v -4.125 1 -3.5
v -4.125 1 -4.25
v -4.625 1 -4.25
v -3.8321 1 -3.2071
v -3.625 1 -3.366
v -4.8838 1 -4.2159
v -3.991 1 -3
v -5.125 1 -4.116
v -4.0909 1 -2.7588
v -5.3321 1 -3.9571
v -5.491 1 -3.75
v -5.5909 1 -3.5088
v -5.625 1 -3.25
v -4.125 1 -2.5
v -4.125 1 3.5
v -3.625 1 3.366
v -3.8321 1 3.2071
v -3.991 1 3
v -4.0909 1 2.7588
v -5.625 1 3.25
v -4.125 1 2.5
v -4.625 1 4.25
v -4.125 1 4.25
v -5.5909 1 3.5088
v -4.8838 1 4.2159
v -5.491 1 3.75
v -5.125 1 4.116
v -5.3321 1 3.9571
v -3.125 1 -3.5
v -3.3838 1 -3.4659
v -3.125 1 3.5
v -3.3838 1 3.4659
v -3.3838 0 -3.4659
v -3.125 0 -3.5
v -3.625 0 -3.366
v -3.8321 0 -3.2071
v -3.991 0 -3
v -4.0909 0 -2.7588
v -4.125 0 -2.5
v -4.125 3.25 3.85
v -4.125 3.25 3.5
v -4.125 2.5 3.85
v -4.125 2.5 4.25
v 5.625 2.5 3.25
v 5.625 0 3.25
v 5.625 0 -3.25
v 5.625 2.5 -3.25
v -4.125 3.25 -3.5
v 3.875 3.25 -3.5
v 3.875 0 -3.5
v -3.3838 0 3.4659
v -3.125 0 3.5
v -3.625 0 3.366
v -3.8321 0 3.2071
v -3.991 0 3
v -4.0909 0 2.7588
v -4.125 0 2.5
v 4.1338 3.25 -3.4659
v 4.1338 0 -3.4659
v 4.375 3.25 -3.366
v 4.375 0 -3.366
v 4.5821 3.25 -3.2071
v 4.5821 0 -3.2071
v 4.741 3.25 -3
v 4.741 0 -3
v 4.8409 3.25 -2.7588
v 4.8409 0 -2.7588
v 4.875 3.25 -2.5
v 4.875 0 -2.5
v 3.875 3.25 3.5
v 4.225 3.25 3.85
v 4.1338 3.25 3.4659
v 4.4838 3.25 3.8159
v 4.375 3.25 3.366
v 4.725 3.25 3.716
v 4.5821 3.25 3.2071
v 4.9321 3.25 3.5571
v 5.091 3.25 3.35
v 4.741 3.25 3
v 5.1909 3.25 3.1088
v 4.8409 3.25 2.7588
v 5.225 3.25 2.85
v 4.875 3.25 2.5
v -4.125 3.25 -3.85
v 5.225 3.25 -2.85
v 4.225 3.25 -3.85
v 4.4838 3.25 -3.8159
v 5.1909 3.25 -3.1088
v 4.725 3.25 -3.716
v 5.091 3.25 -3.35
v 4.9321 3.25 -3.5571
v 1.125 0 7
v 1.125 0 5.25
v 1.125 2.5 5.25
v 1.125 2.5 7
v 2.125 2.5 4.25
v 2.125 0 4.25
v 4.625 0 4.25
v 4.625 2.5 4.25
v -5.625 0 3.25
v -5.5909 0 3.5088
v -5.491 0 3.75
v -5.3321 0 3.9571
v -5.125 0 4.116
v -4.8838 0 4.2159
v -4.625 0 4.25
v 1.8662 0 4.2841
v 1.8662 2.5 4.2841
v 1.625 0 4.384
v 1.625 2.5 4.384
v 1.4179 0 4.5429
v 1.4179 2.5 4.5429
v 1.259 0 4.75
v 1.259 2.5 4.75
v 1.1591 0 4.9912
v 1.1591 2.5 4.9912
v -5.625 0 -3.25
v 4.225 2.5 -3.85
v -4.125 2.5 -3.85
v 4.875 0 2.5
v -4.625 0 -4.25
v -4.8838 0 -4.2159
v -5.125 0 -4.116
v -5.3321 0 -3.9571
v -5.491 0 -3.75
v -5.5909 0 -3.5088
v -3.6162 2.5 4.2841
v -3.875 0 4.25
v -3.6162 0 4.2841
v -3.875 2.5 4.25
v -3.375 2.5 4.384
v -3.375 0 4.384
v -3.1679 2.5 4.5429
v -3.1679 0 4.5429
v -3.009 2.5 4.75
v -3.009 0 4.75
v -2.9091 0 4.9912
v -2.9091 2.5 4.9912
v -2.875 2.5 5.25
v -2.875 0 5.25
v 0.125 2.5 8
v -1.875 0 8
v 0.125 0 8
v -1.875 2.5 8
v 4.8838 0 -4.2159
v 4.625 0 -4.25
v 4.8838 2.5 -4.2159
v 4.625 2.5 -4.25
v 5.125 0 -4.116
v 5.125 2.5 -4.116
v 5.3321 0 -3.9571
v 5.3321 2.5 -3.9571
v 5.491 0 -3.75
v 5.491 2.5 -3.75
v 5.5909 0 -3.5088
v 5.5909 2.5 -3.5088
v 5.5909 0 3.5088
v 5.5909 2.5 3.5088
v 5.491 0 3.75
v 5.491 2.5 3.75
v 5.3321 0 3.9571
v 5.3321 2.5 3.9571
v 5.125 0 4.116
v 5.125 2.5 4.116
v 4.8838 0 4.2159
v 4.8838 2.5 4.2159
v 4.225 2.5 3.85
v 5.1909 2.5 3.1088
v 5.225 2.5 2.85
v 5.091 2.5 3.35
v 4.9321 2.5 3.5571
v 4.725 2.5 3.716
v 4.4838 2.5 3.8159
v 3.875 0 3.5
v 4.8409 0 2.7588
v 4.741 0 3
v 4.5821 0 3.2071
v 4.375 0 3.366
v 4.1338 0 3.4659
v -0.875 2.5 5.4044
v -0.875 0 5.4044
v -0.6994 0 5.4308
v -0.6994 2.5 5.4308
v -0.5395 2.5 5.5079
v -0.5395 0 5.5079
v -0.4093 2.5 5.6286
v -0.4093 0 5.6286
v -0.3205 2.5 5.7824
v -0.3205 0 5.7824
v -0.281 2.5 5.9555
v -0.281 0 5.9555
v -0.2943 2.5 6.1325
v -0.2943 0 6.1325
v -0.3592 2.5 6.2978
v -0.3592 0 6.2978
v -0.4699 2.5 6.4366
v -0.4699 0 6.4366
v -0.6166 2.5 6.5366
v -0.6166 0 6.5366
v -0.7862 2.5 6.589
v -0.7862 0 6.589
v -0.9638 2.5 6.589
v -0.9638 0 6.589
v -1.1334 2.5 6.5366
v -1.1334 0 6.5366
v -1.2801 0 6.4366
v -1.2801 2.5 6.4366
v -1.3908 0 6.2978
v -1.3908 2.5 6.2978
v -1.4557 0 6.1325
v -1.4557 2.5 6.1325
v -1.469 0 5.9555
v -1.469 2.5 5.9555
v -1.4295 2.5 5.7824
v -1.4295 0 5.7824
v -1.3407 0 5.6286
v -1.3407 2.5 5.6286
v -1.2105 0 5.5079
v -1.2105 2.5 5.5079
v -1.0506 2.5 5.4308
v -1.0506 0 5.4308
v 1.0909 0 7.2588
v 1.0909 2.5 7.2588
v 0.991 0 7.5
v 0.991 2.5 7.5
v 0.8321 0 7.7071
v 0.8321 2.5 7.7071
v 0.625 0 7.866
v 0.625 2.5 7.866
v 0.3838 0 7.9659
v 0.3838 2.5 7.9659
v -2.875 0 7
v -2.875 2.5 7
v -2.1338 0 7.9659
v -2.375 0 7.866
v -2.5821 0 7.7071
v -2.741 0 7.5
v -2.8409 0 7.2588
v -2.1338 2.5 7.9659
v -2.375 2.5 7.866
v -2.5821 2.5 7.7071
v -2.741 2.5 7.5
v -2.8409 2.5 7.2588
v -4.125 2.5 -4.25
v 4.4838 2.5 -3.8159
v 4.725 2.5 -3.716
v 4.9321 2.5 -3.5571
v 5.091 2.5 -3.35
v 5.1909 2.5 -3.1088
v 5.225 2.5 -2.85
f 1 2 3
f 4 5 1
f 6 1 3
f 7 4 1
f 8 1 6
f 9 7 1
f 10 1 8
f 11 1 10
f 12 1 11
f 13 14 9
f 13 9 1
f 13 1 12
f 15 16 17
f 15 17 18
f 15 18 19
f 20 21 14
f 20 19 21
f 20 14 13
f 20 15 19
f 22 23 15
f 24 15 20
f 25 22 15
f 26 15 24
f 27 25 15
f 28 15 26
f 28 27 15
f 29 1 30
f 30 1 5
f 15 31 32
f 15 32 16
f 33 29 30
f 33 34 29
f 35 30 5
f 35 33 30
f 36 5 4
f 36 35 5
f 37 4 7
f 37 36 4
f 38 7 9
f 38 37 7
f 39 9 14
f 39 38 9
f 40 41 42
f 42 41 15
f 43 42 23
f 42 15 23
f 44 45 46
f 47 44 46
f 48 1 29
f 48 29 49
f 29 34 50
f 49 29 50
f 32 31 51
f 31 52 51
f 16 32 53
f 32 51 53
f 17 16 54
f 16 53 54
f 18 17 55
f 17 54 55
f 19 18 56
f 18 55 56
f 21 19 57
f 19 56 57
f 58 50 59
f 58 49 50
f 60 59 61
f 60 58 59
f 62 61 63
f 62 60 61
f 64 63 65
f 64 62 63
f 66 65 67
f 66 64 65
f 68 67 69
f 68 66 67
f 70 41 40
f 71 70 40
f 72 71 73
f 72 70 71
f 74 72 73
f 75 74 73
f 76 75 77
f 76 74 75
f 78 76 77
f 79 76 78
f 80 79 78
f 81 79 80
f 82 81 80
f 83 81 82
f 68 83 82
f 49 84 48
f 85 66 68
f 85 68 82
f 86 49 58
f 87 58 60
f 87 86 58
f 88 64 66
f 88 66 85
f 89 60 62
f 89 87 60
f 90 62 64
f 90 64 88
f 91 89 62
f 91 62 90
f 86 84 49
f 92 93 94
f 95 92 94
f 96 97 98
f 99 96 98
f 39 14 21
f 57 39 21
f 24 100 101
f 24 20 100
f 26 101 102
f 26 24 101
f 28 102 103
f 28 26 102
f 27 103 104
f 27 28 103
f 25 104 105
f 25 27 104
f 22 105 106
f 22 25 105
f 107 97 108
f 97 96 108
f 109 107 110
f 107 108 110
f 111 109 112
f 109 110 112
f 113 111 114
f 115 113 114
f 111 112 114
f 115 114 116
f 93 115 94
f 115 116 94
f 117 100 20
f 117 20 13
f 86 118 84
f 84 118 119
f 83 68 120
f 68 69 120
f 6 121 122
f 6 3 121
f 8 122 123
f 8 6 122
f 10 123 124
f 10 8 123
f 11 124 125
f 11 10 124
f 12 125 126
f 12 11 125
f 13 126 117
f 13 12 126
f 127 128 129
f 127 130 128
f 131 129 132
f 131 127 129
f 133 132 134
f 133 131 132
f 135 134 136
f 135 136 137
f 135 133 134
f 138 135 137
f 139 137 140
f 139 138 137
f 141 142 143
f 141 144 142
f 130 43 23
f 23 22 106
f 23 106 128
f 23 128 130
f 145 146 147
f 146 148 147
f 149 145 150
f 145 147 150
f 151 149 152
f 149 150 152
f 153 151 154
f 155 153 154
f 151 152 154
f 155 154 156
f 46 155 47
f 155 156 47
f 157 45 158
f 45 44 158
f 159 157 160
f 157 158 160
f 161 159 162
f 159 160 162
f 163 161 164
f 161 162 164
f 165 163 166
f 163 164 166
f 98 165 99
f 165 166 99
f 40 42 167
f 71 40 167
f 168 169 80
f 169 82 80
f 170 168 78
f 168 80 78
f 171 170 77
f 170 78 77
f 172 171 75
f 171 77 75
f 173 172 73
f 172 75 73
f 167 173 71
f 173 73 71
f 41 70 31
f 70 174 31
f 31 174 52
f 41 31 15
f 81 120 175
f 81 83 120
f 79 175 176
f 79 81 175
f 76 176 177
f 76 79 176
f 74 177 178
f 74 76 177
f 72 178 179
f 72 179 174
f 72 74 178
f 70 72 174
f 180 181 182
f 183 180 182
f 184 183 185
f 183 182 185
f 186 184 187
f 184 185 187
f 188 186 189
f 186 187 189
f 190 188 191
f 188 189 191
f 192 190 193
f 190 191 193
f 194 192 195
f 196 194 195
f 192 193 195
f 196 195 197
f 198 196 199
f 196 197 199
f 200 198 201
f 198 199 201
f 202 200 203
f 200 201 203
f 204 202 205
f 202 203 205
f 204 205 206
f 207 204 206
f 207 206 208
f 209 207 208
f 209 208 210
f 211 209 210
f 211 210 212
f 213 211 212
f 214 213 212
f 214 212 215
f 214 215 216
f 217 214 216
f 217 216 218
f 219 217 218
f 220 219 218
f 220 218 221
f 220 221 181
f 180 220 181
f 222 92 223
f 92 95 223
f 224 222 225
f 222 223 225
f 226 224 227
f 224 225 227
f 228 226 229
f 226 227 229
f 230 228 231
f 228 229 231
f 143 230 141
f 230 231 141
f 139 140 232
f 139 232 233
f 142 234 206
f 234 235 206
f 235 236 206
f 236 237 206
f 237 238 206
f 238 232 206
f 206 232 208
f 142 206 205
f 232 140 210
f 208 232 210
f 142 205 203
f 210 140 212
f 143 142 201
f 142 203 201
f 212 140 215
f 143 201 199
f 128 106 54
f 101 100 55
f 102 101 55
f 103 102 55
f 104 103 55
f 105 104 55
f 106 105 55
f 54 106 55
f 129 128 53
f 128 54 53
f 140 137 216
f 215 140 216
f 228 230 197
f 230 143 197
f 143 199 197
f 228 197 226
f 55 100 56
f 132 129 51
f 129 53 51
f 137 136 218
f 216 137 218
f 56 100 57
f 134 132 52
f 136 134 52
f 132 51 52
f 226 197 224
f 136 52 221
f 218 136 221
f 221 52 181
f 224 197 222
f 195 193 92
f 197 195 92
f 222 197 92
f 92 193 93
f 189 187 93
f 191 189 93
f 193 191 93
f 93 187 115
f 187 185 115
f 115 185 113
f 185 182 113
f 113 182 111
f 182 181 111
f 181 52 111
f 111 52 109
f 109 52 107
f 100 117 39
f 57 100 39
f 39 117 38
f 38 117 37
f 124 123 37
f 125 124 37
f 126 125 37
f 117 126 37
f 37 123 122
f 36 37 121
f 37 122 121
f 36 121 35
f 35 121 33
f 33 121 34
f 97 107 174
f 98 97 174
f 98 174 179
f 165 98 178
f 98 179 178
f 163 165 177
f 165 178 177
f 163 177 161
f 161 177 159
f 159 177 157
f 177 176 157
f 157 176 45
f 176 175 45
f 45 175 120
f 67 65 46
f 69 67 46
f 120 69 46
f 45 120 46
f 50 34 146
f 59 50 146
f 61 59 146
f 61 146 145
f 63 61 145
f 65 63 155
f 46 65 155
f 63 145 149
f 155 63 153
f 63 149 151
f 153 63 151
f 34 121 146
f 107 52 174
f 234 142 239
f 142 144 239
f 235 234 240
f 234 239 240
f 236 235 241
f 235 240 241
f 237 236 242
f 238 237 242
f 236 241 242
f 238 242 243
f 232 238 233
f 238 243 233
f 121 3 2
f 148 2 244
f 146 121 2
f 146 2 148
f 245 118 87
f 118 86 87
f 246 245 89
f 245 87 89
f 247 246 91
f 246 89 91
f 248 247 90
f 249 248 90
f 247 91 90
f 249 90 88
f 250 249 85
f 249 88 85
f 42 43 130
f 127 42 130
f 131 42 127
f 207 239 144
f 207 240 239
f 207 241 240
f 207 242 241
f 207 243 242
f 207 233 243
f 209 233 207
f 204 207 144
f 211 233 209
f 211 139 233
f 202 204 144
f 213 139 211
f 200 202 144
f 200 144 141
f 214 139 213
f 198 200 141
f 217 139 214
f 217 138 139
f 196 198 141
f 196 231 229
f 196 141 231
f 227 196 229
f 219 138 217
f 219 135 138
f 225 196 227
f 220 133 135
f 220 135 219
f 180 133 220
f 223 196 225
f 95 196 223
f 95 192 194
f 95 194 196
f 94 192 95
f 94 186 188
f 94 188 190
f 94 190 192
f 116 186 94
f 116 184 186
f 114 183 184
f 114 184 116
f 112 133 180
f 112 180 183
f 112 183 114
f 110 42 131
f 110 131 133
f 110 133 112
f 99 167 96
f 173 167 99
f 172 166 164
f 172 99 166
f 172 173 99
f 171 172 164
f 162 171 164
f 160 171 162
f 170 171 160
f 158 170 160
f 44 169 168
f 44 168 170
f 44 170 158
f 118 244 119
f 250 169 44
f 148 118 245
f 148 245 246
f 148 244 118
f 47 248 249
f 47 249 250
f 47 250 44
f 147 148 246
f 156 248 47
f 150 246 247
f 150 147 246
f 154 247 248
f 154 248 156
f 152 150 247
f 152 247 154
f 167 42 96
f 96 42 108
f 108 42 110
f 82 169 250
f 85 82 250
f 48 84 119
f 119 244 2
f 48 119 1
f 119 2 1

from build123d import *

# Parameters (mm, degrees)
SKETCH5_W                 = 11.25
SKETCH5_H                 = 8.5
EXTRUDE4_DEPTH            = 2.5
SKETCH19_W                = 1.5
SKETCH19_H                = 8.5
EXTRUDE12_DEPTH           = 1.5
SKETCH21_W                = 9
SKETCH21_H                = 7
EXTRUDE13_DEPTH           = 3.5
SKETCH22_W                = 4
SKETCH22_H                = 2.5
EXTRUDE14_DEPTH           = 3.75
EXTRUDE15_DEPTH           = 0.75
F_0_80_TAPPED_HOLE1_D     = 1.19126
F_0_80_TAPPED_HOLE1_DEPTH = 79.01
F_0_80_TAPPED_HOLE1_TIP   = 0.357890611
FILLET4_R                 = 1


with BuildPart() as part:
    # Sketch5 → Extrude4 (new body)
    with BuildSketch(Plane(origin=(0, 0, 0), x_dir=(1, 0, 0), z_dir=(0, 1, 0))):
        Rectangle(SKETCH5_W, SKETCH5_H)
    extrude(amount=EXTRUDE4_DEPTH)

    # Sketch19 → Extrude12 (cut)
    with BuildSketch(Plane(origin=(0, 2.5, 0), x_dir=(-1, 0, 0), z_dir=(0, 1, 0))):
        with Locations((4.875, 0)):
            Rectangle(SKETCH19_W, SKETCH19_H)
    extrude(amount=-EXTRUDE12_DEPTH, mode=Mode.SUBTRACT)

    # Sketch21 → Extrude13 (cut, through all)
    with BuildSketch(Plane(origin=(0, 2.5, 0), x_dir=(-1, 0, 0), z_dir=(0, 1, 0))):
        with Locations((-0.375, 0)):
            Rectangle(SKETCH21_W, SKETCH21_H)
    extrude(amount=-EXTRUDE13_DEPTH, mode=Mode.SUBTRACT)

    # Sketch22 → Extrude14 (add)
    with BuildSketch(Plane.XY.offset(4.25)):
        with Locations((-0.875, 1.25)):
            Rectangle(SKETCH22_W, SKETCH22_H)
    extrude(amount=EXTRUDE14_DEPTH)

    # Sketch24 → Extrude15 (add)
    with BuildSketch(Plane(origin=(0, 2.5, 0), x_dir=(1, 0, 0), z_dir=(0, 1, 0))):
        Polygon((-4.125, 3.85), (-4.125, 3.5), (4.875, 3.5), (4.875, -3.5), (-4.125, -3.5), (-4.125, -3.85), (5.225, -3.85), (5.225, 3.85), align=None)
    extrude(amount=EXTRUDE15_DEPTH)

    # #0-80 Tapped Hole1
    with Locations(Plane(origin=(-0.875, 2.5, 6), x_dir=(0, 0, 1), z_dir=(0, 1, 0))):
        with Locations((0, 0)):
            Hole(F_0_80_TAPPED_HOLE1_D / 2, depth=F_0_80_TAPPED_HOLE1_DEPTH)
            with Locations((0, 0, -(F_0_80_TAPPED_HOLE1_DEPTH + F_0_80_TAPPED_HOLE1_TIP / 2))):  # 118° drill point
                Cone(0, F_0_80_TAPPED_HOLE1_D / 2, F_0_80_TAPPED_HOLE1_TIP, mode=Mode.SUBTRACT)

    # Fillet4
    fillet4_edges = [part.edges().sort_by_distance(p)[0] for p in [
        (5.625, 1.25, -4.25),
        (5.225, 2.875, -3.85),
        (5.625, 1.25, 4.25),
        (5.225, 2.875, 3.85),
        (4.875, 1.625, 3.5),
        (4.875, 1.625, -3.5),
        (-4.125, 0.5, 3.5),
        (-4.125, 0.5, -3.5),
        (-5.625, 0.5, -4.25),
        (-5.625, 0.5, 4.25),
        (-2.875, 1.25, 4.25),
        (-2.875, 1.25, 8),
        (1.125, 1.25, 8),
        (1.125, 1.25, 4.25),
    ]]
    fillet(fillet4_edges, radius=FILLET4_R)


solid = part.part
